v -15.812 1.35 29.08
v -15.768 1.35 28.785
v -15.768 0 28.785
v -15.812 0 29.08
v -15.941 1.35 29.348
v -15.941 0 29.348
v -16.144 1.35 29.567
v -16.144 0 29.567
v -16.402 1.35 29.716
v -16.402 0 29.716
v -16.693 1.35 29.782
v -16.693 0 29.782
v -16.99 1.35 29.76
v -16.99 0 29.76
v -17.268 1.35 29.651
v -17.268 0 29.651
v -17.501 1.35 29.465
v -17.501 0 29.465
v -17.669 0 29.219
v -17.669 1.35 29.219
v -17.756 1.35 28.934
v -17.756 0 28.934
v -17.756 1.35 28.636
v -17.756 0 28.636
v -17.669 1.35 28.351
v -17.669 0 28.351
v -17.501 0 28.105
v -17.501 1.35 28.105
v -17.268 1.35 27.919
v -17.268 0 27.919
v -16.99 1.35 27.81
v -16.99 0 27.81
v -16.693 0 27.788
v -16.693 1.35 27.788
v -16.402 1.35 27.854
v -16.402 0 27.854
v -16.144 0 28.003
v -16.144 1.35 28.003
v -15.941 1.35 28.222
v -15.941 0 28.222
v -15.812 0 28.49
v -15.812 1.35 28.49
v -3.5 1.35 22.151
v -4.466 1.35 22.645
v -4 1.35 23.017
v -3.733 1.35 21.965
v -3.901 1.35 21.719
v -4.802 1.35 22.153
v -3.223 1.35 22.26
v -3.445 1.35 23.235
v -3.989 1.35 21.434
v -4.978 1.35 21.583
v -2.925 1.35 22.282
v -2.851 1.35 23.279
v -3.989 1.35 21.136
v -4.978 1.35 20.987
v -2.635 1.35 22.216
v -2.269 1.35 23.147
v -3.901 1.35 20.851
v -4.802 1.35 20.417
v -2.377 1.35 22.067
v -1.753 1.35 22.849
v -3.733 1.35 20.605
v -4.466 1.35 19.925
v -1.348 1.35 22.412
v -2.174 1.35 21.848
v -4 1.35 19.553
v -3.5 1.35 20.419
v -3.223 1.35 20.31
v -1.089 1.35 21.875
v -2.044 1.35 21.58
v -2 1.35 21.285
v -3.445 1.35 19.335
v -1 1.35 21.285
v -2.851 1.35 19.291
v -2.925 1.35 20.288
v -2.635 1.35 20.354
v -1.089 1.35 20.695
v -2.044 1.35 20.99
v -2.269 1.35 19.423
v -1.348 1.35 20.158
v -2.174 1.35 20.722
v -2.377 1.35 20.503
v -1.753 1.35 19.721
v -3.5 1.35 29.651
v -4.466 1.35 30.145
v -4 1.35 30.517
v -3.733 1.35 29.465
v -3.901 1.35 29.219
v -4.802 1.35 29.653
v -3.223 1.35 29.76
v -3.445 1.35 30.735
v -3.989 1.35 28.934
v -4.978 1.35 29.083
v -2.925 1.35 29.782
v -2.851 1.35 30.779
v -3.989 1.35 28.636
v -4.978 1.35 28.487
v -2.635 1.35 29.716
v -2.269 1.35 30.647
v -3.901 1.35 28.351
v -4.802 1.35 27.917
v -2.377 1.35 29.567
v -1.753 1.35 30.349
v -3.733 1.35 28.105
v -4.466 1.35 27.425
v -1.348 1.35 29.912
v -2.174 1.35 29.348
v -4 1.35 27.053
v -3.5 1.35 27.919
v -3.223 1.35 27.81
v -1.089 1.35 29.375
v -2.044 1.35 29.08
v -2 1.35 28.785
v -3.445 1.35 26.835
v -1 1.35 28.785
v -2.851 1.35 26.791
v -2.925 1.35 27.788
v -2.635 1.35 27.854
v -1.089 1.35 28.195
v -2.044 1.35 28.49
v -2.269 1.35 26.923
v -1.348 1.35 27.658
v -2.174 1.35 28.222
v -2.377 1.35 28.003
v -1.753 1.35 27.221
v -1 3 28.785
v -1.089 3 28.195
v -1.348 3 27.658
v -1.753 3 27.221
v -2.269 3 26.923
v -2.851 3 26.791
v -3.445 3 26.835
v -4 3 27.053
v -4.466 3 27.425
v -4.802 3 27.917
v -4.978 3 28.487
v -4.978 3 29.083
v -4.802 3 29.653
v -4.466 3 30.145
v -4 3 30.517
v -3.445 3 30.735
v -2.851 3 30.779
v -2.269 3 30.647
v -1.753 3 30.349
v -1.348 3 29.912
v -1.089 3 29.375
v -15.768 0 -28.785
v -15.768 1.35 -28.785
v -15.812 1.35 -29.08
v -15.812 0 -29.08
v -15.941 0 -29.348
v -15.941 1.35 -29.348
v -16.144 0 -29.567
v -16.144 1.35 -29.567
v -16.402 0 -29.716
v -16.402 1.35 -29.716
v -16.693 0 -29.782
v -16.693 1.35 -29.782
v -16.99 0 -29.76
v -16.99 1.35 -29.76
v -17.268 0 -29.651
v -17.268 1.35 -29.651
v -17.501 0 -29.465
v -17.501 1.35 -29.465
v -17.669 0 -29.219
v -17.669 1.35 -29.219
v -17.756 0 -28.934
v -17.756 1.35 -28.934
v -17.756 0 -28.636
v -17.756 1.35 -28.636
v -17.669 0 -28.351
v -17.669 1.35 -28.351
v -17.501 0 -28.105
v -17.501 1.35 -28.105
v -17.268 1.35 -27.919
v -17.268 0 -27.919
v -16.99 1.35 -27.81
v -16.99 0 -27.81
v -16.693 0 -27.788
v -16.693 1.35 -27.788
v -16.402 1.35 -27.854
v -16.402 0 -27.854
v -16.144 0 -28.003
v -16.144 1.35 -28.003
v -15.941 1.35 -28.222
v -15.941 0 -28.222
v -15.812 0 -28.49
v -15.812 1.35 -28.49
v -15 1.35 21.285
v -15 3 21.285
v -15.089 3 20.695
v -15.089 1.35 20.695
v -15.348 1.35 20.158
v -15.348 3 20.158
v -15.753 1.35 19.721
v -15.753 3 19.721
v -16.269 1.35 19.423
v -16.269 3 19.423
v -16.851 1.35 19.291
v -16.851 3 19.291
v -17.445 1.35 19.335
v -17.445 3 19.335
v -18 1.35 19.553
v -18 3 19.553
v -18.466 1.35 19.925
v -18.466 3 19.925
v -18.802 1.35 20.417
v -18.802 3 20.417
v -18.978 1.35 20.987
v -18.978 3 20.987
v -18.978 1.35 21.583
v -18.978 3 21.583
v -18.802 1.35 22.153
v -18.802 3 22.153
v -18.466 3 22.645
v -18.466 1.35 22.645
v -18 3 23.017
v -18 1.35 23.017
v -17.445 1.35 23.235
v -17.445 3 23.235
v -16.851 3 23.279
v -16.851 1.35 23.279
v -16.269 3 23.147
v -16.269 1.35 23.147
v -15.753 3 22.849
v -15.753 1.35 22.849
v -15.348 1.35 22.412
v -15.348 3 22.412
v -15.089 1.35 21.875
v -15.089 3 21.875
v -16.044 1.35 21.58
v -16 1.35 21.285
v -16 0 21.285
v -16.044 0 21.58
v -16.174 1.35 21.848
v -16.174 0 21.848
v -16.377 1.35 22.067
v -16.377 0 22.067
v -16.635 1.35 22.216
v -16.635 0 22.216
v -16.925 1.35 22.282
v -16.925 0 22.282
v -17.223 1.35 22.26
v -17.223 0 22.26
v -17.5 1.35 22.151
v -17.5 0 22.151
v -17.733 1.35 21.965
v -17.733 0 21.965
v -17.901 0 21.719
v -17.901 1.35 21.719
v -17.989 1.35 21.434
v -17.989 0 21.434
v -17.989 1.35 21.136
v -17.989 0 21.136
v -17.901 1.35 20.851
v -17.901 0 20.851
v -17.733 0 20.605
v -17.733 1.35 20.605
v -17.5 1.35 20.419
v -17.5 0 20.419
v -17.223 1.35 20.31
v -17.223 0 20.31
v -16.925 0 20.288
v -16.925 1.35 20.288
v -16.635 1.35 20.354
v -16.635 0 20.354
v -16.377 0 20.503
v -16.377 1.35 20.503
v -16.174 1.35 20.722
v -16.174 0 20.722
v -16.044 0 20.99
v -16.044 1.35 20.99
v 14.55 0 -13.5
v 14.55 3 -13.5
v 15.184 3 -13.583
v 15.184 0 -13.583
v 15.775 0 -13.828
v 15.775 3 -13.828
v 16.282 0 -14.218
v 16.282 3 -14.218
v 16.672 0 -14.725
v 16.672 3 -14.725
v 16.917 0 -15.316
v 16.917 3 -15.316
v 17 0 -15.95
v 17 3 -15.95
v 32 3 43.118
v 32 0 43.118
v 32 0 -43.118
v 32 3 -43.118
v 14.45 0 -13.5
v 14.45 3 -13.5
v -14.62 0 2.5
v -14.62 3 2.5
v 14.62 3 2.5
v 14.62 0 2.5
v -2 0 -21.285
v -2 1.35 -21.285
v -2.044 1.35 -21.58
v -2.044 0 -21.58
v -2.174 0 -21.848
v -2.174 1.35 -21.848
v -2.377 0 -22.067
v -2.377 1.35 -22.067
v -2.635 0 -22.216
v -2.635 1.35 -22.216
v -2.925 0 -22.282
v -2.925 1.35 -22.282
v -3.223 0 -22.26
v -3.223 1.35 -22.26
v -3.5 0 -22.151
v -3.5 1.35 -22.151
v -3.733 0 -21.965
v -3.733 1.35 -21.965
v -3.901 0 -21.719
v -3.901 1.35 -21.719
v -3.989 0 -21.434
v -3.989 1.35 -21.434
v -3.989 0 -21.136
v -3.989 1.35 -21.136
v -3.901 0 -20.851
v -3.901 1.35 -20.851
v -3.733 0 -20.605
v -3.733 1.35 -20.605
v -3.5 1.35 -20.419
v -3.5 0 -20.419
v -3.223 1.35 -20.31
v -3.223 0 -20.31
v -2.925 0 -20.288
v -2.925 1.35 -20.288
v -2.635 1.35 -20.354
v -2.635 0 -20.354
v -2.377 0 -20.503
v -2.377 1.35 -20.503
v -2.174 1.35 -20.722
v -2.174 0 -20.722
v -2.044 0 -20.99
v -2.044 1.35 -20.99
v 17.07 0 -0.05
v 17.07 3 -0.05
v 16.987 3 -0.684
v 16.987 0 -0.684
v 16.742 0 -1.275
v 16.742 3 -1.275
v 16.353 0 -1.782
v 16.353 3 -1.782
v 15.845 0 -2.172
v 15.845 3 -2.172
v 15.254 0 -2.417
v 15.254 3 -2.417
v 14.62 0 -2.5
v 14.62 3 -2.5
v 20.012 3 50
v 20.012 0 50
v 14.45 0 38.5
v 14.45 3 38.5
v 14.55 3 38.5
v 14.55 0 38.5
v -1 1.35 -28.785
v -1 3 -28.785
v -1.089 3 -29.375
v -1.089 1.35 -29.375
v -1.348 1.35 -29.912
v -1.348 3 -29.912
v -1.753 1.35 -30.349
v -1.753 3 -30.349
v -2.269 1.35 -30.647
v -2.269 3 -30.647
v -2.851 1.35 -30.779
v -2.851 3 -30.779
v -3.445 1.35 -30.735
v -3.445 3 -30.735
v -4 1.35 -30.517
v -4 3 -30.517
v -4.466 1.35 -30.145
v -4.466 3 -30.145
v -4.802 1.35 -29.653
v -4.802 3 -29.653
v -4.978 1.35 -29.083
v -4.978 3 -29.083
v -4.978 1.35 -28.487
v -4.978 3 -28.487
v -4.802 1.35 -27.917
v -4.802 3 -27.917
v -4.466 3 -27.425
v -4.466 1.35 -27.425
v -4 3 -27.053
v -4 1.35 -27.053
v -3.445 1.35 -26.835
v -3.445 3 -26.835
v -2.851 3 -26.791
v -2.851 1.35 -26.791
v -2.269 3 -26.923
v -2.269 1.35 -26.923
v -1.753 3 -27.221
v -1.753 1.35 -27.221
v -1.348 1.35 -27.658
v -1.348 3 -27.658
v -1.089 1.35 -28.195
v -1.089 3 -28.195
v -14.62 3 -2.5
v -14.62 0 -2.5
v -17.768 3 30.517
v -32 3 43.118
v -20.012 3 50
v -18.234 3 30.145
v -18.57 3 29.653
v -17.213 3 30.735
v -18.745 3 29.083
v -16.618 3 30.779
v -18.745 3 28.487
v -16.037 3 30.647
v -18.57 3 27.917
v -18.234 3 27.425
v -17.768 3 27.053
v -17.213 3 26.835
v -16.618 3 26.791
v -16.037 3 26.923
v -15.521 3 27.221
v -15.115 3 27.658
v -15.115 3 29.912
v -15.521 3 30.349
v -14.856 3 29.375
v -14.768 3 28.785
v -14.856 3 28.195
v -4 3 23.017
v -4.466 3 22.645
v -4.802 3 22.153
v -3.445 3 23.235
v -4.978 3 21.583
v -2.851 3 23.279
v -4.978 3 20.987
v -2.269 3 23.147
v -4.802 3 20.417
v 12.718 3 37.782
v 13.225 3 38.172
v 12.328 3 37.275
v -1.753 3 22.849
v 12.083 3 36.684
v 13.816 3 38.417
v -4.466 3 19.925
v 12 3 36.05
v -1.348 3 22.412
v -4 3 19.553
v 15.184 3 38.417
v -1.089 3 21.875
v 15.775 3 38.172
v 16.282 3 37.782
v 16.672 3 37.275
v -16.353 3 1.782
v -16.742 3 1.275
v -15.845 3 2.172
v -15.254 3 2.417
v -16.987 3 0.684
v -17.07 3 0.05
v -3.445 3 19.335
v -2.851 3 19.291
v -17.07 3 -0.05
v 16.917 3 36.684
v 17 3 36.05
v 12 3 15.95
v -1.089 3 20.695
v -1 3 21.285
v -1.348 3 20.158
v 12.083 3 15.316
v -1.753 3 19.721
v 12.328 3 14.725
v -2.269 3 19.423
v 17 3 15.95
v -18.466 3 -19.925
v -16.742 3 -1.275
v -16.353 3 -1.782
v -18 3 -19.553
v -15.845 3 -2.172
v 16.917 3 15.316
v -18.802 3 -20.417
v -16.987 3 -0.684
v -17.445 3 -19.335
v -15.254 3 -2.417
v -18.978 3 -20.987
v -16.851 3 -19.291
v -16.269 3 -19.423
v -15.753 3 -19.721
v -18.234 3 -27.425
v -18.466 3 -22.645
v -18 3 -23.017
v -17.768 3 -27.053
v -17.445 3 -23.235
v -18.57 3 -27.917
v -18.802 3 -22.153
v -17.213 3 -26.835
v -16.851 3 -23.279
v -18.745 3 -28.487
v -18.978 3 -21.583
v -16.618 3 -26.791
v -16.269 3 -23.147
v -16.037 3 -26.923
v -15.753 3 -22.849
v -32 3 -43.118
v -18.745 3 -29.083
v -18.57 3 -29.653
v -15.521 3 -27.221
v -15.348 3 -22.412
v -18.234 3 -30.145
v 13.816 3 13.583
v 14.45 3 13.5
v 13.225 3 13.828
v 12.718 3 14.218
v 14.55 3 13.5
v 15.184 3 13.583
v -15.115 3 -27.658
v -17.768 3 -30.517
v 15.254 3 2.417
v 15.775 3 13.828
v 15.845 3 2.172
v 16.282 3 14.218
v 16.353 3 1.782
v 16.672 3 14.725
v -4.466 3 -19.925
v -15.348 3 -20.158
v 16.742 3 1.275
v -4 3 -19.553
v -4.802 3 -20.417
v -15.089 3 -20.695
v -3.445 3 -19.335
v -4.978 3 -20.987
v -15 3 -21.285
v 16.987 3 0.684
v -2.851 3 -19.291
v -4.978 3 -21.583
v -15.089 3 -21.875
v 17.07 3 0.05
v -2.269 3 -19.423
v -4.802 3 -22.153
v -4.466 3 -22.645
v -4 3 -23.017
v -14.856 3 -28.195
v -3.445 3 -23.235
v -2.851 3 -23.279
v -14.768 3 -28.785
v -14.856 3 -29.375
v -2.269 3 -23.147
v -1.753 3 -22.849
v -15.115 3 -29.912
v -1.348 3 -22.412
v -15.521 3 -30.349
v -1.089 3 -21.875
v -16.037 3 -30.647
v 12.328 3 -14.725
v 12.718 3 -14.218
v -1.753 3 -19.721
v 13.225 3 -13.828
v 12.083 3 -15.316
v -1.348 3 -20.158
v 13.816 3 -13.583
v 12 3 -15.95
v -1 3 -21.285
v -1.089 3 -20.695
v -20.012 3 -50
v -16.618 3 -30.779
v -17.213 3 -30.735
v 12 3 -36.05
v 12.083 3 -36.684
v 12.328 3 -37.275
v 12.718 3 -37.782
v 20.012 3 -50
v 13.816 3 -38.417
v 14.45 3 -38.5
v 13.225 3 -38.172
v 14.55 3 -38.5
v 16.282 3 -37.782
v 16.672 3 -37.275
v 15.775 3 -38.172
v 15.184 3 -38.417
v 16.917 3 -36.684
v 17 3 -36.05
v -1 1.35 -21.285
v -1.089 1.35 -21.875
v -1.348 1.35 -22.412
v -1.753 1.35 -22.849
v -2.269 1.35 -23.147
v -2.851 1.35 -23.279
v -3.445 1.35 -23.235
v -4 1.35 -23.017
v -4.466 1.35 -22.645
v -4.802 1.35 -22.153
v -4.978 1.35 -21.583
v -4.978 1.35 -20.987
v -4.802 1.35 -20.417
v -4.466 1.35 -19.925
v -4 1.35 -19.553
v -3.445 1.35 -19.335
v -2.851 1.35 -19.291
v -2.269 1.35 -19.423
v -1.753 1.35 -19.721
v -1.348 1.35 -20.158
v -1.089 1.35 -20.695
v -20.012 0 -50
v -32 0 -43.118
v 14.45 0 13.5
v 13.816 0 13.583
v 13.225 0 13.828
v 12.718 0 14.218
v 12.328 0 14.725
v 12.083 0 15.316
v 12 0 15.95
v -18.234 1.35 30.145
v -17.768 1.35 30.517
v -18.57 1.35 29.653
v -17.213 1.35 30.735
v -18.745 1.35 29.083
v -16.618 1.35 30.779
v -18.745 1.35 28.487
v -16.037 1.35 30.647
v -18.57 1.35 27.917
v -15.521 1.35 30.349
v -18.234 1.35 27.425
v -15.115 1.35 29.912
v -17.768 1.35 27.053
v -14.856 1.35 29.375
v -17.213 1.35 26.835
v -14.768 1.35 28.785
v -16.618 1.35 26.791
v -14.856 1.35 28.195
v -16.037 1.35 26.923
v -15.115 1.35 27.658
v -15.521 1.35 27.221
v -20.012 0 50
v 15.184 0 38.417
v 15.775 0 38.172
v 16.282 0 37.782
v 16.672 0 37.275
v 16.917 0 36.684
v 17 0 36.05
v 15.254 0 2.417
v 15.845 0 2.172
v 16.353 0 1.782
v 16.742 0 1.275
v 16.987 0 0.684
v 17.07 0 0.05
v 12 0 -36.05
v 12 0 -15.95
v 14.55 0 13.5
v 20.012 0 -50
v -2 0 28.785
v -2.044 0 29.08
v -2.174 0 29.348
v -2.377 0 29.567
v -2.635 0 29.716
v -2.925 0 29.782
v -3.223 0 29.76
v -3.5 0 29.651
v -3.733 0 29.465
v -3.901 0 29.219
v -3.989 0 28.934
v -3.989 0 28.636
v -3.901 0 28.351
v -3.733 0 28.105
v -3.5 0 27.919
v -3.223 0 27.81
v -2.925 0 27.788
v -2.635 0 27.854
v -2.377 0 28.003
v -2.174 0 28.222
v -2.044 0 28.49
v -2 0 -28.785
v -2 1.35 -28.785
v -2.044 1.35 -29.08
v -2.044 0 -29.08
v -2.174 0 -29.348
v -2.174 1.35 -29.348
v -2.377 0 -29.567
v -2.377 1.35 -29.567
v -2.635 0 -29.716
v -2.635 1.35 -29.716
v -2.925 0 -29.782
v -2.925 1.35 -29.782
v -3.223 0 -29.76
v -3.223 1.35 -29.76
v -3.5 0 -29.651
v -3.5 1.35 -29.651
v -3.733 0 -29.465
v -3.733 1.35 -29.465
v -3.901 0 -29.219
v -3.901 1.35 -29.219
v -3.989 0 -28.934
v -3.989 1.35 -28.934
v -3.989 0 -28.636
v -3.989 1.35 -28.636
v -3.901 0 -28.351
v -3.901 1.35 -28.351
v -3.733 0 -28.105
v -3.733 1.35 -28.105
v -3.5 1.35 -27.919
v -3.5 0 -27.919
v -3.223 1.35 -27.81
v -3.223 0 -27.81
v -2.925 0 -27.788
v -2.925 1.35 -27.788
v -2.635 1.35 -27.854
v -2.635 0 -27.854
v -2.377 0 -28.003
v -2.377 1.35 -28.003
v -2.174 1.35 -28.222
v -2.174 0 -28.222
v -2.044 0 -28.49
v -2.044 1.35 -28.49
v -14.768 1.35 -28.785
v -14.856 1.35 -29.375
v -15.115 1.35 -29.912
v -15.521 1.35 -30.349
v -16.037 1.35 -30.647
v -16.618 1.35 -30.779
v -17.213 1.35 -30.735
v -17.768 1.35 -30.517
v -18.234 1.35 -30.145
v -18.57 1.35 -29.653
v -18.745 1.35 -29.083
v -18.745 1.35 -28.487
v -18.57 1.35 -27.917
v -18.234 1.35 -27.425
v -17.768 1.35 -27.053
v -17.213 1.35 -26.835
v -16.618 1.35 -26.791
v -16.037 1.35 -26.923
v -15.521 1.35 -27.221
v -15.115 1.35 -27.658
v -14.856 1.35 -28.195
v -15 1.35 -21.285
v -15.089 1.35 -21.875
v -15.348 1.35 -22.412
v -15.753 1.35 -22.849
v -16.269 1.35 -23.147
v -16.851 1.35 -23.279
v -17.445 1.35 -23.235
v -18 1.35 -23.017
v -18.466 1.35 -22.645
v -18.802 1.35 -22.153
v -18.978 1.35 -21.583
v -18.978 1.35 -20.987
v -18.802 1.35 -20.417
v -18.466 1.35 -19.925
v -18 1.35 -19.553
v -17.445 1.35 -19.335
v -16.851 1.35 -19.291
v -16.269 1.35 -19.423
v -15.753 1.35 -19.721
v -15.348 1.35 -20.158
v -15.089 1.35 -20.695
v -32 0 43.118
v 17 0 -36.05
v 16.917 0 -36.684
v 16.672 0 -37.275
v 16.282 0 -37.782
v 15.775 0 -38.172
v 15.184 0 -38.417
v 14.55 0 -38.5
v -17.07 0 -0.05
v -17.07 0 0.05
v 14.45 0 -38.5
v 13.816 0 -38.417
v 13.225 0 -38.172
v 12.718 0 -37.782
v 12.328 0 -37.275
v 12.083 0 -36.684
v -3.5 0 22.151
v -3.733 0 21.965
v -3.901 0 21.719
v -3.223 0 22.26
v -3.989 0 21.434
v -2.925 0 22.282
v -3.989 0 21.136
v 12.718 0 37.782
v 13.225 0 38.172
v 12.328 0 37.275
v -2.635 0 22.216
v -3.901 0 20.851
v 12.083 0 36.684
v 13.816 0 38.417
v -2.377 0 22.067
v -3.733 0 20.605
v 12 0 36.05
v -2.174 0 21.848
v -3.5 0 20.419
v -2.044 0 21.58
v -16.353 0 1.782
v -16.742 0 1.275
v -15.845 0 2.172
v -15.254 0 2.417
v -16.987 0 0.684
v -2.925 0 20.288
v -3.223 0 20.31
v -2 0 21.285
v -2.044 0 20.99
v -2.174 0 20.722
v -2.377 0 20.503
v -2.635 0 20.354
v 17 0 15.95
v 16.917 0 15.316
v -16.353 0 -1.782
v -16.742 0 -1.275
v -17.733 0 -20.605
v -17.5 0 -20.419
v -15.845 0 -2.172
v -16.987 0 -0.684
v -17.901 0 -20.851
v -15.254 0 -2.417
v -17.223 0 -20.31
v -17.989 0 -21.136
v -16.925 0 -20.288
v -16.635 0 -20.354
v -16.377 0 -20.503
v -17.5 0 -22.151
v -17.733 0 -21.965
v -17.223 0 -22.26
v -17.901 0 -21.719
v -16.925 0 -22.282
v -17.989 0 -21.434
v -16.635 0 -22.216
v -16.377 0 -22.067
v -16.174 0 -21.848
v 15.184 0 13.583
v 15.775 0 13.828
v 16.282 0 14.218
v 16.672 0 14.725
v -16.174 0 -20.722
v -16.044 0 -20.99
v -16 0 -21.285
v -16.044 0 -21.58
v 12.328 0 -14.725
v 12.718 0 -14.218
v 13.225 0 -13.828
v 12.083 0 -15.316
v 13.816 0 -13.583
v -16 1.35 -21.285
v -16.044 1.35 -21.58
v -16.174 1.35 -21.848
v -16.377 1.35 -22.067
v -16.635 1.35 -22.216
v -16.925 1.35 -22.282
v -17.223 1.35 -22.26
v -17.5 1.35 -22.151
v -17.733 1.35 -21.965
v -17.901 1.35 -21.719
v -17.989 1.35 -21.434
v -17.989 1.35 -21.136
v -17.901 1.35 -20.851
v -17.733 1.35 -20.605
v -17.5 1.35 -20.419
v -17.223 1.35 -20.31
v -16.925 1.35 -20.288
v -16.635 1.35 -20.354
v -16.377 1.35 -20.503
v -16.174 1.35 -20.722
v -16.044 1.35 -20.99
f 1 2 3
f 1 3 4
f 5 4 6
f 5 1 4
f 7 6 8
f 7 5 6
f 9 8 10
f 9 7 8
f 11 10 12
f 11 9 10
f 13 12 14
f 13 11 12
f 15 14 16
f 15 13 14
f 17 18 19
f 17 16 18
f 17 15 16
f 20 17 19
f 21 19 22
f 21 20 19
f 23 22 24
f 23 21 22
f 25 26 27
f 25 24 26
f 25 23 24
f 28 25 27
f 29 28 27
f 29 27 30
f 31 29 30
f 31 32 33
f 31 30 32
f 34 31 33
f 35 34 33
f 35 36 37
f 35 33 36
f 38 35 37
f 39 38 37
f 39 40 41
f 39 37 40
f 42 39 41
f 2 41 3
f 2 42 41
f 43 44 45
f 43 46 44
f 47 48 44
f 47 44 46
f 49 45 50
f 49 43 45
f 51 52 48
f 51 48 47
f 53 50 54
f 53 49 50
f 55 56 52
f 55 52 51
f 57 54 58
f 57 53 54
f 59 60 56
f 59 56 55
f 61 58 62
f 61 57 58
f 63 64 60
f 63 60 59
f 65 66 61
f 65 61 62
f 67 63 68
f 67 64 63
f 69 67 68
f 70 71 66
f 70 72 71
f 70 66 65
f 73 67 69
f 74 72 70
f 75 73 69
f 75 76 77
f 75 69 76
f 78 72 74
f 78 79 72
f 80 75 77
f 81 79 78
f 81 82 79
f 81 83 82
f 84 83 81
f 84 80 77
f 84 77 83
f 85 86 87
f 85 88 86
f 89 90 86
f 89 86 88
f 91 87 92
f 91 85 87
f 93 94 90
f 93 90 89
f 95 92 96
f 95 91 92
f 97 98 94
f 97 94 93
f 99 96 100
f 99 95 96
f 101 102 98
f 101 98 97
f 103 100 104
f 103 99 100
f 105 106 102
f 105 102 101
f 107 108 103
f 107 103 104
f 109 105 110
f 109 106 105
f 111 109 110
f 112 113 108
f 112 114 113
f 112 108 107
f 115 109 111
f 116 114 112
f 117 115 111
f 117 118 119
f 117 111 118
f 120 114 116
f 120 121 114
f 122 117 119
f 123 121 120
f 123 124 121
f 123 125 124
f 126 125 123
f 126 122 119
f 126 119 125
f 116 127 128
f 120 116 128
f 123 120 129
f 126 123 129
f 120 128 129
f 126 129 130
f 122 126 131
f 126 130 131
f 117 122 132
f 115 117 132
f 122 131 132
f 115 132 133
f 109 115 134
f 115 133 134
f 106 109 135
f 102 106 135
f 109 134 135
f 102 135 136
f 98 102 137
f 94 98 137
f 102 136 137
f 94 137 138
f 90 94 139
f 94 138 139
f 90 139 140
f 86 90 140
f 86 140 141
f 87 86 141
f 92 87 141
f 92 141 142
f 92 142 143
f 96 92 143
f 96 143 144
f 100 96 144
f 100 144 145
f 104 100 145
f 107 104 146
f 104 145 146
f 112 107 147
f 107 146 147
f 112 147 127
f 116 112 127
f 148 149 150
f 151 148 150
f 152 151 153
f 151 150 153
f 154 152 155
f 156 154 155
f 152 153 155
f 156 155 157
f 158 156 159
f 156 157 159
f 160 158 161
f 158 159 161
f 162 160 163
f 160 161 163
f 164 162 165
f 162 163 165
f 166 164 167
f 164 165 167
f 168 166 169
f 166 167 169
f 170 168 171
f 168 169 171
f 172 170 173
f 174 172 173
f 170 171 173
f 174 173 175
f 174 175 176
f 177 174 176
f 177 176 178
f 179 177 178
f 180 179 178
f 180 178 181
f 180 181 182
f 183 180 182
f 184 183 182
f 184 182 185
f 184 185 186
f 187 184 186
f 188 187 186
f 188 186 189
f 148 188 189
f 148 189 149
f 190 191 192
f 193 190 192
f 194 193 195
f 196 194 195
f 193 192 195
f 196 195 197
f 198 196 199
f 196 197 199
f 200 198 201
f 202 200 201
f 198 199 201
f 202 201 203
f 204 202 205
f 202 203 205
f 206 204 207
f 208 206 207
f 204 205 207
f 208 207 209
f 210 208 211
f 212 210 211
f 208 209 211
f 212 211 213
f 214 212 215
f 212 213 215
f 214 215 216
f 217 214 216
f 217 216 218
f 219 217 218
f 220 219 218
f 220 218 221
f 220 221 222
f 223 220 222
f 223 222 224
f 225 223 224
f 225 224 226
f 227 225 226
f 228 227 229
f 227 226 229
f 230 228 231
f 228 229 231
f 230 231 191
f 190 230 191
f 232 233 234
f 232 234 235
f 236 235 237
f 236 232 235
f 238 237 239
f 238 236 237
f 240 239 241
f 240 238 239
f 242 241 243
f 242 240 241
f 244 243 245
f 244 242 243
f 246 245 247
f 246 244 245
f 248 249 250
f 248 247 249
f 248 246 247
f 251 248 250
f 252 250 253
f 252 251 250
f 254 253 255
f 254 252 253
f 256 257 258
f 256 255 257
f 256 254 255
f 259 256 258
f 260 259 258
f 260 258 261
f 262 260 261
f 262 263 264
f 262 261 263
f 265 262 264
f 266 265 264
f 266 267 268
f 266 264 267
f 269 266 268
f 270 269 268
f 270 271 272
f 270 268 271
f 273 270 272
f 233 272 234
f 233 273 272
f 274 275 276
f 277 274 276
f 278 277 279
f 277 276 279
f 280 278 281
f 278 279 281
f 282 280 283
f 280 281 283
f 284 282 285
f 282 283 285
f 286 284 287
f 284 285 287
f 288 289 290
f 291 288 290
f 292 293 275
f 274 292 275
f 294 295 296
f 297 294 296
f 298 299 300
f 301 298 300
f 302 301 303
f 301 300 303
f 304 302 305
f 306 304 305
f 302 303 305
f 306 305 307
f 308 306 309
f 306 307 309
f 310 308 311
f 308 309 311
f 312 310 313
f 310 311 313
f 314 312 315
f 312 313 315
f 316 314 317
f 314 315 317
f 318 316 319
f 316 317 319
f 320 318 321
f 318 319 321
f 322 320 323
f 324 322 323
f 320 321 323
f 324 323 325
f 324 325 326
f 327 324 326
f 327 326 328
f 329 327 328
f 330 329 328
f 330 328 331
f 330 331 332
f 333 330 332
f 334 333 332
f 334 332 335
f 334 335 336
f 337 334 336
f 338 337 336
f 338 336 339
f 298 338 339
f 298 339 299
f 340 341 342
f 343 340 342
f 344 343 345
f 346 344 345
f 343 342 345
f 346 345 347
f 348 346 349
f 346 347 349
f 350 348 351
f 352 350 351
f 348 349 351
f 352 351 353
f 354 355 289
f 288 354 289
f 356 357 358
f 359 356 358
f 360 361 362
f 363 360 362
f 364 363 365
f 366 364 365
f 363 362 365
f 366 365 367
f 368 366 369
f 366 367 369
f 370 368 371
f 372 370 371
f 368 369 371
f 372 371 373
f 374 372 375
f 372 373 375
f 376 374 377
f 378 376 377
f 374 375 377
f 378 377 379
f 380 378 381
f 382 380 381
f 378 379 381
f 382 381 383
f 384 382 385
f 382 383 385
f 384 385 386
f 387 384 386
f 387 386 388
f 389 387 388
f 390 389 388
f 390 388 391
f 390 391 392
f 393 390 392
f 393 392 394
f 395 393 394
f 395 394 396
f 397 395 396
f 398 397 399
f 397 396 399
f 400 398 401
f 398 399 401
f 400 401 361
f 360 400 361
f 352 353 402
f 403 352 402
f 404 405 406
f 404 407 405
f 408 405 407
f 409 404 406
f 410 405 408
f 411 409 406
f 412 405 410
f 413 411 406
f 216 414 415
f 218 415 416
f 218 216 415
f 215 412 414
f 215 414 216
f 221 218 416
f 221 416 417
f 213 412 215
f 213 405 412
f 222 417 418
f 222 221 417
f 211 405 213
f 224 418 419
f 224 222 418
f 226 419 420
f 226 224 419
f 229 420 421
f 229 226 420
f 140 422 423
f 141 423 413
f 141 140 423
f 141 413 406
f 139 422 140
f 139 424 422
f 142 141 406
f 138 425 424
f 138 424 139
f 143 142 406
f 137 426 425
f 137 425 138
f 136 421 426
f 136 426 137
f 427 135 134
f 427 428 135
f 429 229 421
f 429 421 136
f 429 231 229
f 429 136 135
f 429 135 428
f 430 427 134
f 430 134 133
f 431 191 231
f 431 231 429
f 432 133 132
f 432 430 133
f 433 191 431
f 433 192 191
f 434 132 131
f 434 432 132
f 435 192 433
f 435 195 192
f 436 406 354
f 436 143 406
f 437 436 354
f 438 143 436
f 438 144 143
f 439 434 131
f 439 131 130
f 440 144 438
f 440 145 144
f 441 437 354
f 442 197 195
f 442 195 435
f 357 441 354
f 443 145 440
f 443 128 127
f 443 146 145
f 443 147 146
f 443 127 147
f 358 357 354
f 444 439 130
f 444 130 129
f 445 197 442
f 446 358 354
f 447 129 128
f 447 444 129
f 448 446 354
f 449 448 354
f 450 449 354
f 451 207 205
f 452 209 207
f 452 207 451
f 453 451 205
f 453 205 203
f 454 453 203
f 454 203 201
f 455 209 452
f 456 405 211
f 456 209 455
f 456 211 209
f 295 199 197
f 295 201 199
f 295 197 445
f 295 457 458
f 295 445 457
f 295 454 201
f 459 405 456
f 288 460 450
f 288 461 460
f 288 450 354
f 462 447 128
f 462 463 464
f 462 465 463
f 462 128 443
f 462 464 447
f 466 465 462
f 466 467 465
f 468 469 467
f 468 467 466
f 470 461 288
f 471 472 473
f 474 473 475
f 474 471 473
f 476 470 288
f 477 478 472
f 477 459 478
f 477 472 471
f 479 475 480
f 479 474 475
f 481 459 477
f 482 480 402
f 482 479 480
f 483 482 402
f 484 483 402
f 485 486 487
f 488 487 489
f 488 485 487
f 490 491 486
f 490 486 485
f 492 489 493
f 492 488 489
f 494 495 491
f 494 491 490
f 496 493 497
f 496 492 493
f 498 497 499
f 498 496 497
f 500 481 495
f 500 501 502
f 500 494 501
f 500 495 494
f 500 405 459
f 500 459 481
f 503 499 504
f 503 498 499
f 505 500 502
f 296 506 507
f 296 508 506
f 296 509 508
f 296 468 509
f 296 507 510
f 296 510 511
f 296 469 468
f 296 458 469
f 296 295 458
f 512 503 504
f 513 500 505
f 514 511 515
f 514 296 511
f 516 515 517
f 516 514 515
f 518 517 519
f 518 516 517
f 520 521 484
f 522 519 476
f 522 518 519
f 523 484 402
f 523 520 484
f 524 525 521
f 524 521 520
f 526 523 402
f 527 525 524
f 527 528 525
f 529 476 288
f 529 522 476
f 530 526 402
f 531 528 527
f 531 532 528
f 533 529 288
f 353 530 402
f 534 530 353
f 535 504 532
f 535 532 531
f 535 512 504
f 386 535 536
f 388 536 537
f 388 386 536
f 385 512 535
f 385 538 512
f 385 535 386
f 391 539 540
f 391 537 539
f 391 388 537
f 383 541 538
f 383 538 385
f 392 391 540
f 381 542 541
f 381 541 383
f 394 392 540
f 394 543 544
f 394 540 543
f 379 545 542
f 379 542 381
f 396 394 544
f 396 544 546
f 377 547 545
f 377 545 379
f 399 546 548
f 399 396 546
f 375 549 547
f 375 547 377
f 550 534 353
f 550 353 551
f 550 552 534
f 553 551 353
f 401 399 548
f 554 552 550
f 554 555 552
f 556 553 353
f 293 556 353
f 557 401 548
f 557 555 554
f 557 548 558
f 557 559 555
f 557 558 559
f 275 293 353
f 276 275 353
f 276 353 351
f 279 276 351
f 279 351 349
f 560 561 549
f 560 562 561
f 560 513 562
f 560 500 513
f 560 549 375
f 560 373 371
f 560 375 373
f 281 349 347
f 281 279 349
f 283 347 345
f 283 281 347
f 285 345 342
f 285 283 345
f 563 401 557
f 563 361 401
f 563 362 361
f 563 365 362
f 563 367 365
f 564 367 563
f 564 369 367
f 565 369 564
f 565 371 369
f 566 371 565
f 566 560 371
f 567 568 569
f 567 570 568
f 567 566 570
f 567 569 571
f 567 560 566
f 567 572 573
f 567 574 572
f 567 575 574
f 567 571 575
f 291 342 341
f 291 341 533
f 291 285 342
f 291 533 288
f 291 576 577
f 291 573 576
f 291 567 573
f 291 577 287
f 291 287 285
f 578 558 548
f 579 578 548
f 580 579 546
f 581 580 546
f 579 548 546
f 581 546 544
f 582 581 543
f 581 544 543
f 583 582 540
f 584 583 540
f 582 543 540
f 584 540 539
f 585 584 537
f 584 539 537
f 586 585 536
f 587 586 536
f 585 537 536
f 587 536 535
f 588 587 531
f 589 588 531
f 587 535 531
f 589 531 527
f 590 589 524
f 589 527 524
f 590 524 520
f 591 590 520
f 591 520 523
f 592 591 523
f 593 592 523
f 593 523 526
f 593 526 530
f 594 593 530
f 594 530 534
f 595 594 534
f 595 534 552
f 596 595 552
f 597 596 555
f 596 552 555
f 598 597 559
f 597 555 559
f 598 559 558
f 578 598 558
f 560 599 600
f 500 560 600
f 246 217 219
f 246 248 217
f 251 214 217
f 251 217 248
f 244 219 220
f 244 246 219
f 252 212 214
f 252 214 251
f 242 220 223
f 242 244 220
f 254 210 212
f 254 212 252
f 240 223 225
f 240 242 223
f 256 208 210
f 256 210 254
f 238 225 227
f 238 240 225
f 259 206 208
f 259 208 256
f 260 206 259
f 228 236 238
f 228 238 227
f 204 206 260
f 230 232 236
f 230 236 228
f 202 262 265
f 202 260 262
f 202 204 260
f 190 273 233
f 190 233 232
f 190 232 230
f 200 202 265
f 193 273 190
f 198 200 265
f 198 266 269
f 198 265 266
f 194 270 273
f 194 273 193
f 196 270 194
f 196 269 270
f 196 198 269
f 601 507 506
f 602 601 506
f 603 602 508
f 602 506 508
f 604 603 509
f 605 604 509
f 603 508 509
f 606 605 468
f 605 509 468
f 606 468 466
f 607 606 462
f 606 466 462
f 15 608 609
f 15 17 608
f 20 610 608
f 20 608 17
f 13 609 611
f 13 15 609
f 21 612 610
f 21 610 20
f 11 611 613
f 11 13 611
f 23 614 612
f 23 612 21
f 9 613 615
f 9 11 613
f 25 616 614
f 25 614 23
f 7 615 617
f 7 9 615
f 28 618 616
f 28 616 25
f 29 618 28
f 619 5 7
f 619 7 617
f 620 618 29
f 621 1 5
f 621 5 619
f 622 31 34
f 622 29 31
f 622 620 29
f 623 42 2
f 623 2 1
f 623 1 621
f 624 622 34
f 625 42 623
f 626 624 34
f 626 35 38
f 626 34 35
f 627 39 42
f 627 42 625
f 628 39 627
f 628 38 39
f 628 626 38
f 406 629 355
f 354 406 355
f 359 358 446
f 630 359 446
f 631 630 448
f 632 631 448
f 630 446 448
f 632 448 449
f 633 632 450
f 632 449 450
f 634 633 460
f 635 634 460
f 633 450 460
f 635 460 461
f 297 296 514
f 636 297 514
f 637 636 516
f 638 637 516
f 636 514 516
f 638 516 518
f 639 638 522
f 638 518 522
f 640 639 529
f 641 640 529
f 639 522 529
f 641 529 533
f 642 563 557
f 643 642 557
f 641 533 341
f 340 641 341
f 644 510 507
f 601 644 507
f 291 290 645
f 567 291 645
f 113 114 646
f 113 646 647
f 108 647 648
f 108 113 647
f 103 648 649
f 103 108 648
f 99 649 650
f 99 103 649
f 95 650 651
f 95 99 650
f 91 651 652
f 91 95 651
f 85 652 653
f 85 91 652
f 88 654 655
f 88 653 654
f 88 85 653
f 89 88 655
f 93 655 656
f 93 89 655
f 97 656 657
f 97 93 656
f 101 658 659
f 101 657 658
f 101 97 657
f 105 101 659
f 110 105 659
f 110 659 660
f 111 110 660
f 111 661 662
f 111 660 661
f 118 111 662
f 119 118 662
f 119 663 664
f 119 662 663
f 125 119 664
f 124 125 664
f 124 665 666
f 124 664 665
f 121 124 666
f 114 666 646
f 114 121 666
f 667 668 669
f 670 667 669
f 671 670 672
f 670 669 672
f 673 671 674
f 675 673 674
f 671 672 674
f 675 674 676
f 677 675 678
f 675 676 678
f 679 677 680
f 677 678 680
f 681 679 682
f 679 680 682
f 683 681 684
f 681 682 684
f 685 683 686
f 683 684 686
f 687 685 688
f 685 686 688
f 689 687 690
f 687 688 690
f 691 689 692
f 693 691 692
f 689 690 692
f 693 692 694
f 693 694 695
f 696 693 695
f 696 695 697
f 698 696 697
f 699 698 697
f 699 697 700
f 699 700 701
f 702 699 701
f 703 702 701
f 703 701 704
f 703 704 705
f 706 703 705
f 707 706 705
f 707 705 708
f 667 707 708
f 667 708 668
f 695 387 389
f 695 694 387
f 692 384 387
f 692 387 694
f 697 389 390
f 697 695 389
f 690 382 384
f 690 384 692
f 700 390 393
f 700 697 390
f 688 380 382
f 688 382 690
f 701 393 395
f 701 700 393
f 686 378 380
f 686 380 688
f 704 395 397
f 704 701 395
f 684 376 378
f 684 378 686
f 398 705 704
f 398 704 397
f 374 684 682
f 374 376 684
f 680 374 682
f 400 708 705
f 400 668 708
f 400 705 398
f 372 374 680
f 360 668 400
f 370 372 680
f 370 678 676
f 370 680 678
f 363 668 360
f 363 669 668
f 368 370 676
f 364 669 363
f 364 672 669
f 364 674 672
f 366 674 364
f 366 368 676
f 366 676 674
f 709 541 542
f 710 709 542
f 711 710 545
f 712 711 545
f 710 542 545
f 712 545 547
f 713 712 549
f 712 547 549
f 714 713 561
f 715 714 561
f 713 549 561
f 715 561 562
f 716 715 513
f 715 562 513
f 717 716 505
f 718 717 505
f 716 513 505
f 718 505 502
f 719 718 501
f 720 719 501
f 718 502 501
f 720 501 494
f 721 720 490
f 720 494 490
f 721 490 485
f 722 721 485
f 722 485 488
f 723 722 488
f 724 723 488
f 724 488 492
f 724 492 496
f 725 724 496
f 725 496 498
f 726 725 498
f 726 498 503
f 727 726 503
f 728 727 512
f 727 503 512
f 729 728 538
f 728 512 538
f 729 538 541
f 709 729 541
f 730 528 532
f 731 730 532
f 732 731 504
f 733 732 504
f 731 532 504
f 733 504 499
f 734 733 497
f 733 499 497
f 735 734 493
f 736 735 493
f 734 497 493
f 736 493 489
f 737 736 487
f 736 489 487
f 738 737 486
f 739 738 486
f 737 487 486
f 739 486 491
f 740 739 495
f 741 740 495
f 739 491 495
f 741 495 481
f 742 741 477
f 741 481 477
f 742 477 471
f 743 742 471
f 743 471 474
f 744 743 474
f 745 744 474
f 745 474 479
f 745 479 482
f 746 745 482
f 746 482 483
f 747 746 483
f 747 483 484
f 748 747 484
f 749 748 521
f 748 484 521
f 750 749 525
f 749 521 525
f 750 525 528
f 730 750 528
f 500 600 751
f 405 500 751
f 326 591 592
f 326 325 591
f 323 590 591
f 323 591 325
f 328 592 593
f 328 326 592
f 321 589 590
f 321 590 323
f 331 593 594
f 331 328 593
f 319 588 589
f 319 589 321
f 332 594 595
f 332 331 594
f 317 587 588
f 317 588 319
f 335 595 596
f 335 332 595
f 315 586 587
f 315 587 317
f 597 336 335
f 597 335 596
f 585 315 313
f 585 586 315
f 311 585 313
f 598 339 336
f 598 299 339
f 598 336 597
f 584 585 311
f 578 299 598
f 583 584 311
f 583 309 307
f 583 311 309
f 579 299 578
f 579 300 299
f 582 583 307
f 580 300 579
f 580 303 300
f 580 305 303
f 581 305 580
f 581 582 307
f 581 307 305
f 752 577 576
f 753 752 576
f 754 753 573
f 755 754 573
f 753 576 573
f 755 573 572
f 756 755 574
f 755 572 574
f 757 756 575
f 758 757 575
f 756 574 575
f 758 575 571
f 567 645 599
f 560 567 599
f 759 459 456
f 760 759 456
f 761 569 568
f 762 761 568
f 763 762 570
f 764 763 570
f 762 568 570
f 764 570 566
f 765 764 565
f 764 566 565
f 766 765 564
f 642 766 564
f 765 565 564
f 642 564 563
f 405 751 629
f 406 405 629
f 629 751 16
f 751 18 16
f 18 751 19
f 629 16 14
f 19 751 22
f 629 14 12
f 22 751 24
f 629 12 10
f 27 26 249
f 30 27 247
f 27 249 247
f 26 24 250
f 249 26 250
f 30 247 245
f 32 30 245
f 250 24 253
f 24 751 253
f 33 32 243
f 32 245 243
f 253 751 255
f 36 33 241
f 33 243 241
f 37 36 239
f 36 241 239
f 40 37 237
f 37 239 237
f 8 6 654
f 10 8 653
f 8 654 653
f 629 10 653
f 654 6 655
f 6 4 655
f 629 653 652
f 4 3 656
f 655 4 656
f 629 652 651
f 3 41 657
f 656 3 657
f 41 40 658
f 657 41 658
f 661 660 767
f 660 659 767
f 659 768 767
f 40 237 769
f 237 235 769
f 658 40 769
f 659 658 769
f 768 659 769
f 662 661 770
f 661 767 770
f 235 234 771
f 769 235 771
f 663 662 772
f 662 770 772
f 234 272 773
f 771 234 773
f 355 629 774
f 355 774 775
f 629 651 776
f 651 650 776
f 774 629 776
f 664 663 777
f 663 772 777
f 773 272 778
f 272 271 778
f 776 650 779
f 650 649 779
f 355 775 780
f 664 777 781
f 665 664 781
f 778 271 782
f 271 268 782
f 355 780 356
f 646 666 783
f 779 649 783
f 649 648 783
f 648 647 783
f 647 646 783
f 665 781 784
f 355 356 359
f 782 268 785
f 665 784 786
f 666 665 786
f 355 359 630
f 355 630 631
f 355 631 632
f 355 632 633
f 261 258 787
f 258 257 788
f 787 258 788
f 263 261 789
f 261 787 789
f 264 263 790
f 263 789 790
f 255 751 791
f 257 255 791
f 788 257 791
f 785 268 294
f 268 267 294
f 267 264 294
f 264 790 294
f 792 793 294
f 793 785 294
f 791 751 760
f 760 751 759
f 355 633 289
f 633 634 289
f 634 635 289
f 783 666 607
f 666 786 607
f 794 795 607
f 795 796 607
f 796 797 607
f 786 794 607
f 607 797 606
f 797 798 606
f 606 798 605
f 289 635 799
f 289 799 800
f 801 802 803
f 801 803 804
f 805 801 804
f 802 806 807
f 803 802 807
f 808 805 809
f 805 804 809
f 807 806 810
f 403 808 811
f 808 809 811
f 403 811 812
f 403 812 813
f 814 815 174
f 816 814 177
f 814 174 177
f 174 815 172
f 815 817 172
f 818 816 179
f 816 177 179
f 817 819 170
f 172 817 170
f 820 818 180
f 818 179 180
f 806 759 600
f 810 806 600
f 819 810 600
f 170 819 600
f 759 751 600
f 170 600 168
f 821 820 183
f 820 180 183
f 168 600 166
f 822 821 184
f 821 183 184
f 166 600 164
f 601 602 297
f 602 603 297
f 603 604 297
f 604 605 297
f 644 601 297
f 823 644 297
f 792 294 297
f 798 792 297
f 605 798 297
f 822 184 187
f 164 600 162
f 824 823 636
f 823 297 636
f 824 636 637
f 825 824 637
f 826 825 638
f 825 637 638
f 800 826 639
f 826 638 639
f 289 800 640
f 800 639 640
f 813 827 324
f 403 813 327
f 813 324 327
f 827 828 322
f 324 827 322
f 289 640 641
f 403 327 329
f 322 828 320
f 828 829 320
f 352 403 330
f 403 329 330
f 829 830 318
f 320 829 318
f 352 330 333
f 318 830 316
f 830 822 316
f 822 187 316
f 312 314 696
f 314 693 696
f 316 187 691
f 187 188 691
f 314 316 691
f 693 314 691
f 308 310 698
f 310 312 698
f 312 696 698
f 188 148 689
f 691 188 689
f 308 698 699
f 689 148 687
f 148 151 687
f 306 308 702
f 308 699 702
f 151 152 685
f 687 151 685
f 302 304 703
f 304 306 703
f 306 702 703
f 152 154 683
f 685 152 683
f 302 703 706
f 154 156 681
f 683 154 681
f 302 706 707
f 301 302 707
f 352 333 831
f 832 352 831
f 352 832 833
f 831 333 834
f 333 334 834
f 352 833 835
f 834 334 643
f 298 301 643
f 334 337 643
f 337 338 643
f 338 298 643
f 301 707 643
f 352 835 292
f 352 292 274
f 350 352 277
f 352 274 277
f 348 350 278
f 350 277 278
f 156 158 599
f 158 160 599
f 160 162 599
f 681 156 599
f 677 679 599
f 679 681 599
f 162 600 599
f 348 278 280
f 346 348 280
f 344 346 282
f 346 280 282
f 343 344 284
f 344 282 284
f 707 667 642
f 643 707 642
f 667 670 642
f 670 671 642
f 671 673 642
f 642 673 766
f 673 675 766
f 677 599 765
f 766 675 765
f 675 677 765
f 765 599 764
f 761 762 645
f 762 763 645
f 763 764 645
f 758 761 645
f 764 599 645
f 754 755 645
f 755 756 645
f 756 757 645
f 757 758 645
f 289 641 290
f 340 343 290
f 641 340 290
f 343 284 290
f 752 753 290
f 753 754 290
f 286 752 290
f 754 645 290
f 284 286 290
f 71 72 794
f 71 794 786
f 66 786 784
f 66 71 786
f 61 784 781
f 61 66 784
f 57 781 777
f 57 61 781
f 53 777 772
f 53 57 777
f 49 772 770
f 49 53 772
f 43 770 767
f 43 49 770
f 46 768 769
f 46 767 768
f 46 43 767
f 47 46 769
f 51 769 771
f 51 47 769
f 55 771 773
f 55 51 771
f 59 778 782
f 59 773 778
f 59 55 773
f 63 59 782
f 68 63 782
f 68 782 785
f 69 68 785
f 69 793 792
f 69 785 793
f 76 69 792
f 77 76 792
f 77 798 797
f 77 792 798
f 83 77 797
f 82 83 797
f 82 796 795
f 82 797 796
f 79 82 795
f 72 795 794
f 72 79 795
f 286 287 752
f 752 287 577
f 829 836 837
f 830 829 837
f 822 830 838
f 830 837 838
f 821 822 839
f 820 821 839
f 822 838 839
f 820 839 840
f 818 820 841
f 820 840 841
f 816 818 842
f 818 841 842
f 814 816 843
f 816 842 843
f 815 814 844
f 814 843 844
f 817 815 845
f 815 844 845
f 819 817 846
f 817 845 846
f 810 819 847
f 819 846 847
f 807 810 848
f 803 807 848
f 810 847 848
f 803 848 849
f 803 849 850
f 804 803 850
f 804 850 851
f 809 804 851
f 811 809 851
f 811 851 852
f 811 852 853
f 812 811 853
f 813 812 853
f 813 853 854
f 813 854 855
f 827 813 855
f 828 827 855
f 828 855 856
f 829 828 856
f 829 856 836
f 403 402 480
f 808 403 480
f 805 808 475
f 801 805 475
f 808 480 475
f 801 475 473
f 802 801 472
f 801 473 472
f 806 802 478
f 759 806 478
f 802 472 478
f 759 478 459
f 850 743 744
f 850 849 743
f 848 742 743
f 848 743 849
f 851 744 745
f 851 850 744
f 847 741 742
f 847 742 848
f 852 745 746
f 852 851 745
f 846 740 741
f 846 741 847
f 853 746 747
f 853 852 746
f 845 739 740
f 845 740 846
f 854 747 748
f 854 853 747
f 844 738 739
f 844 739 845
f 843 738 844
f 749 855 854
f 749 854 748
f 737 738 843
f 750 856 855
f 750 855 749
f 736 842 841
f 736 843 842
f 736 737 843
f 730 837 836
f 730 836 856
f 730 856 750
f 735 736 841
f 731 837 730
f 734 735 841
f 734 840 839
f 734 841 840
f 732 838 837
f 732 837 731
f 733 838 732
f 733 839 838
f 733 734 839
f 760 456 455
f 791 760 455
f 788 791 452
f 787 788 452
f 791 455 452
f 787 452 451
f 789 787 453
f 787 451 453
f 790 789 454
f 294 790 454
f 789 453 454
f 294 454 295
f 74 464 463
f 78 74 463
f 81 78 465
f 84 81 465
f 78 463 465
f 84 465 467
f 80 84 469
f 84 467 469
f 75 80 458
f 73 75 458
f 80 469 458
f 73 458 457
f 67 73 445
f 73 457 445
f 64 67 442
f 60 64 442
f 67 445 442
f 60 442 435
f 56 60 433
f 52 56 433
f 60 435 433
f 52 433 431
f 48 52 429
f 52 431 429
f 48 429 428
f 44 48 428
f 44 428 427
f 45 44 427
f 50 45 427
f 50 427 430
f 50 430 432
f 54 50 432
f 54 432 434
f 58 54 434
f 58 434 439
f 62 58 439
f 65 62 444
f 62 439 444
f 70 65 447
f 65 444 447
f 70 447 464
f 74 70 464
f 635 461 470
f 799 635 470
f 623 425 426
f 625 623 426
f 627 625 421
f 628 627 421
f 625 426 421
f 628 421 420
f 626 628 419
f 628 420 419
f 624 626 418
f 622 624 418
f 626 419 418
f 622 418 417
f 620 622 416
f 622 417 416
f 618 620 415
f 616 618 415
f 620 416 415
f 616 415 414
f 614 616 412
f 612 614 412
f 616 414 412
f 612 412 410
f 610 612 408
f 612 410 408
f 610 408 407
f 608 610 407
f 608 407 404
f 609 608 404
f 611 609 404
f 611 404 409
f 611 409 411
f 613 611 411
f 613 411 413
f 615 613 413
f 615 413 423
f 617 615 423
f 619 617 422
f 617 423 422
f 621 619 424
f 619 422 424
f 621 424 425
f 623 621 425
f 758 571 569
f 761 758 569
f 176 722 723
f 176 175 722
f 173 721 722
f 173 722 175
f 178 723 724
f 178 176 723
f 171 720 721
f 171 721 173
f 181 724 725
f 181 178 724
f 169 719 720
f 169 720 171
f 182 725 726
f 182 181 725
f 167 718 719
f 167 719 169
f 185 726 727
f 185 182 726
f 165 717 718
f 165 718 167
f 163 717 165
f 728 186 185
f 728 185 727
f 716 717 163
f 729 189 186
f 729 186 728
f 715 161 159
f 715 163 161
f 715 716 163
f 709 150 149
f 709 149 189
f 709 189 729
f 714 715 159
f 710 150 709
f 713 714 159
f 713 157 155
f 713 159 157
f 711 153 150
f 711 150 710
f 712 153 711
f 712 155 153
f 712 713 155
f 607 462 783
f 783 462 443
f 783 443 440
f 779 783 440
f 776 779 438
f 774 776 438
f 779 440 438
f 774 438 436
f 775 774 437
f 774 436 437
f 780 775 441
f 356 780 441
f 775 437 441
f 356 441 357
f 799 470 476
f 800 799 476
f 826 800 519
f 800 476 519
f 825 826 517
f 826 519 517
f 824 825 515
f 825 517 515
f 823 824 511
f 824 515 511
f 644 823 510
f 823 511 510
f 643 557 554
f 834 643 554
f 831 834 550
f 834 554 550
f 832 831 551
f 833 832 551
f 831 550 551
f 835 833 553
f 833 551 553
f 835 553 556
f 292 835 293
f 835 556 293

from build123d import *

# Parameters (mm, degrees)
BOSS_EXTRUDE1_DEPTH = 3
CUT_EXTRUDE2_DEPTH  = 10
SKETCH7_R           = 1
CUT_EXTRUDE3_DEPTH  = 11.5
SKETCH8_R           = 2
CUT_EXTRUDE4_DEPTH  = 1.65


with BuildPart() as part:
    # Sketch1 → Boss-Extrude1 (new body)
    with BuildSketch(Plane(origin=(0, 0, 0), x_dir=(1, 0, 0), z_dir=(0, 1, 0))):
        Polygon((-32, -43.117707706), (-20.011895516, -50), (20.011895516, -50), (32, -43.117707706), (32, 43.117707706), (20.011895516, 50), (-20.011895516, 50), (-32, 43.117707706), align=None)
    extrude(amount=BOSS_EXTRUDE1_DEPTH)

    # Sketch5 → Cut-Extrude2 (cut)
    with BuildSketch(Plane(origin=(0, 3, 0), x_dir=(1, 0, 0), z_dir=(0, 1, 0))):
        with BuildLine():
            Line((-14.620176413, -2.5), (14.620176413, -2.5))
            ThreePointArc((14.620176413, -2.5), (16.352588027, -1.782411614), (17.070176413, -0.05))
            Line((17.070176413, -0.05), (17.070176413, 0.05))
            ThreePointArc((17.070176413, 0.05), (16.352588027, 1.782411614), (14.620176413, 2.5))
            Line((14.620176413, 2.5), (-14.620176413, 2.5))
            ThreePointArc((-14.620176413, 2.5), (-16.352588027, 1.782411614), (-17.070176413, 0.05))
            Line((-17.070176413, 0.05), (-17.070176413, -0.05))
            ThreePointArc((-17.070176413, -0.05), (-16.352588027, -1.782411614), (-14.620176413, -2.5))
        make_face()
        with BuildLine():
            Line((14.45, -38.5), (14.55, -38.5))
            ThreePointArc((14.55, -38.5), (16.282411614, -37.782411614), (17, -36.05))
            Line((17, -36.05), (17, -15.95))
            ThreePointArc((17, -15.95), (16.282411614, -14.217588386), (14.55, -13.5))
            Line((14.55, -13.5), (14.45, -13.5))
            ThreePointArc((14.45, -13.5), (12.717588386, -14.217588386), (12, -15.95))
            Line((12, -15.95), (12, -36.05))
            ThreePointArc((12, -36.05), (12.717588386, -37.782411614), (14.45, -38.5))
        make_face()
        with BuildLine():
            Line((14.45, 13.5), (14.55, 13.5))
            ThreePointArc((14.55, 13.5), (16.282411614, 14.217588386), (17, 15.95))
            Line((17, 15.95), (17, 36.05))
            ThreePointArc((17, 36.05), (16.282411614, 37.782411614), (14.55, 38.5))
            Line((14.55, 38.5), (14.45, 38.5))
            ThreePointArc((14.45, 38.5), (12.717588386, 37.782411614), (12, 36.05))
            Line((12, 36.05), (12, 15.95))
            ThreePointArc((12, 15.95), (12.717588386, 14.217588386), (14.45, 13.5))
        make_face()
    extrude(amount=-CUT_EXTRUDE2_DEPTH, mode=Mode.SUBTRACT)

    # Sketch7 → Cut-Extrude3 (cut)
    with BuildSketch(Plane(origin=(0, 3, 0), x_dir=(1, 0, 0), z_dir=(0, 1, 0))):
        with Locations((-3, 28.785)):
            Circle(SKETCH7_R)
        with Locations((-3, 21.285)):
            Circle(SKETCH7_R)
        with Locations((-17, 21.285)):
            Circle(SKETCH7_R)
        with Locations((-16.76760758, 28.785)):
            Circle(SKETCH7_R)
    cut_extrude3 = extrude(amount=-CUT_EXTRUDE3_DEPTH, mode=Mode.SUBTRACT)

    # Mirror1: Cut-Extrude3 across plane
    add(cut_extrude3.mirror(Plane(origin=(0, 0, 0), x_dir=(1, 0, 0), z_dir=(0, 0, -1))), mode=Mode.SUBTRACT)

    # Sketch8 → Cut-Extrude4 (cut)
    with BuildSketch(Plane(origin=(0, 3, 0), x_dir=(1, 0, 0), z_dir=(0, 1, 0))):
        with Locations((-3, -28.785)):
            Circle(SKETCH8_R)
        with Locations((-16.76760758, -28.785)):
            Circle(SKETCH8_R)
        with Locations((-17, -21.285)):
            Circle(SKETCH8_R)
        with Locations((-3, -21.285)):
            Circle(SKETCH8_R)
        with Locations((-3, 28.785)):
            Circle(SKETCH8_R)
        with Locations((-3, 21.285)):
            Circle(SKETCH8_R)
        with Locations((-17, 21.285)):
            Circle(SKETCH8_R)
        with Locations((-16.76760758, 28.785)):
            Circle(SKETCH8_R)
    extrude(amount=-CUT_EXTRUDE4_DEPTH, mode=Mode.SUBTRACT)


solid = part.part
